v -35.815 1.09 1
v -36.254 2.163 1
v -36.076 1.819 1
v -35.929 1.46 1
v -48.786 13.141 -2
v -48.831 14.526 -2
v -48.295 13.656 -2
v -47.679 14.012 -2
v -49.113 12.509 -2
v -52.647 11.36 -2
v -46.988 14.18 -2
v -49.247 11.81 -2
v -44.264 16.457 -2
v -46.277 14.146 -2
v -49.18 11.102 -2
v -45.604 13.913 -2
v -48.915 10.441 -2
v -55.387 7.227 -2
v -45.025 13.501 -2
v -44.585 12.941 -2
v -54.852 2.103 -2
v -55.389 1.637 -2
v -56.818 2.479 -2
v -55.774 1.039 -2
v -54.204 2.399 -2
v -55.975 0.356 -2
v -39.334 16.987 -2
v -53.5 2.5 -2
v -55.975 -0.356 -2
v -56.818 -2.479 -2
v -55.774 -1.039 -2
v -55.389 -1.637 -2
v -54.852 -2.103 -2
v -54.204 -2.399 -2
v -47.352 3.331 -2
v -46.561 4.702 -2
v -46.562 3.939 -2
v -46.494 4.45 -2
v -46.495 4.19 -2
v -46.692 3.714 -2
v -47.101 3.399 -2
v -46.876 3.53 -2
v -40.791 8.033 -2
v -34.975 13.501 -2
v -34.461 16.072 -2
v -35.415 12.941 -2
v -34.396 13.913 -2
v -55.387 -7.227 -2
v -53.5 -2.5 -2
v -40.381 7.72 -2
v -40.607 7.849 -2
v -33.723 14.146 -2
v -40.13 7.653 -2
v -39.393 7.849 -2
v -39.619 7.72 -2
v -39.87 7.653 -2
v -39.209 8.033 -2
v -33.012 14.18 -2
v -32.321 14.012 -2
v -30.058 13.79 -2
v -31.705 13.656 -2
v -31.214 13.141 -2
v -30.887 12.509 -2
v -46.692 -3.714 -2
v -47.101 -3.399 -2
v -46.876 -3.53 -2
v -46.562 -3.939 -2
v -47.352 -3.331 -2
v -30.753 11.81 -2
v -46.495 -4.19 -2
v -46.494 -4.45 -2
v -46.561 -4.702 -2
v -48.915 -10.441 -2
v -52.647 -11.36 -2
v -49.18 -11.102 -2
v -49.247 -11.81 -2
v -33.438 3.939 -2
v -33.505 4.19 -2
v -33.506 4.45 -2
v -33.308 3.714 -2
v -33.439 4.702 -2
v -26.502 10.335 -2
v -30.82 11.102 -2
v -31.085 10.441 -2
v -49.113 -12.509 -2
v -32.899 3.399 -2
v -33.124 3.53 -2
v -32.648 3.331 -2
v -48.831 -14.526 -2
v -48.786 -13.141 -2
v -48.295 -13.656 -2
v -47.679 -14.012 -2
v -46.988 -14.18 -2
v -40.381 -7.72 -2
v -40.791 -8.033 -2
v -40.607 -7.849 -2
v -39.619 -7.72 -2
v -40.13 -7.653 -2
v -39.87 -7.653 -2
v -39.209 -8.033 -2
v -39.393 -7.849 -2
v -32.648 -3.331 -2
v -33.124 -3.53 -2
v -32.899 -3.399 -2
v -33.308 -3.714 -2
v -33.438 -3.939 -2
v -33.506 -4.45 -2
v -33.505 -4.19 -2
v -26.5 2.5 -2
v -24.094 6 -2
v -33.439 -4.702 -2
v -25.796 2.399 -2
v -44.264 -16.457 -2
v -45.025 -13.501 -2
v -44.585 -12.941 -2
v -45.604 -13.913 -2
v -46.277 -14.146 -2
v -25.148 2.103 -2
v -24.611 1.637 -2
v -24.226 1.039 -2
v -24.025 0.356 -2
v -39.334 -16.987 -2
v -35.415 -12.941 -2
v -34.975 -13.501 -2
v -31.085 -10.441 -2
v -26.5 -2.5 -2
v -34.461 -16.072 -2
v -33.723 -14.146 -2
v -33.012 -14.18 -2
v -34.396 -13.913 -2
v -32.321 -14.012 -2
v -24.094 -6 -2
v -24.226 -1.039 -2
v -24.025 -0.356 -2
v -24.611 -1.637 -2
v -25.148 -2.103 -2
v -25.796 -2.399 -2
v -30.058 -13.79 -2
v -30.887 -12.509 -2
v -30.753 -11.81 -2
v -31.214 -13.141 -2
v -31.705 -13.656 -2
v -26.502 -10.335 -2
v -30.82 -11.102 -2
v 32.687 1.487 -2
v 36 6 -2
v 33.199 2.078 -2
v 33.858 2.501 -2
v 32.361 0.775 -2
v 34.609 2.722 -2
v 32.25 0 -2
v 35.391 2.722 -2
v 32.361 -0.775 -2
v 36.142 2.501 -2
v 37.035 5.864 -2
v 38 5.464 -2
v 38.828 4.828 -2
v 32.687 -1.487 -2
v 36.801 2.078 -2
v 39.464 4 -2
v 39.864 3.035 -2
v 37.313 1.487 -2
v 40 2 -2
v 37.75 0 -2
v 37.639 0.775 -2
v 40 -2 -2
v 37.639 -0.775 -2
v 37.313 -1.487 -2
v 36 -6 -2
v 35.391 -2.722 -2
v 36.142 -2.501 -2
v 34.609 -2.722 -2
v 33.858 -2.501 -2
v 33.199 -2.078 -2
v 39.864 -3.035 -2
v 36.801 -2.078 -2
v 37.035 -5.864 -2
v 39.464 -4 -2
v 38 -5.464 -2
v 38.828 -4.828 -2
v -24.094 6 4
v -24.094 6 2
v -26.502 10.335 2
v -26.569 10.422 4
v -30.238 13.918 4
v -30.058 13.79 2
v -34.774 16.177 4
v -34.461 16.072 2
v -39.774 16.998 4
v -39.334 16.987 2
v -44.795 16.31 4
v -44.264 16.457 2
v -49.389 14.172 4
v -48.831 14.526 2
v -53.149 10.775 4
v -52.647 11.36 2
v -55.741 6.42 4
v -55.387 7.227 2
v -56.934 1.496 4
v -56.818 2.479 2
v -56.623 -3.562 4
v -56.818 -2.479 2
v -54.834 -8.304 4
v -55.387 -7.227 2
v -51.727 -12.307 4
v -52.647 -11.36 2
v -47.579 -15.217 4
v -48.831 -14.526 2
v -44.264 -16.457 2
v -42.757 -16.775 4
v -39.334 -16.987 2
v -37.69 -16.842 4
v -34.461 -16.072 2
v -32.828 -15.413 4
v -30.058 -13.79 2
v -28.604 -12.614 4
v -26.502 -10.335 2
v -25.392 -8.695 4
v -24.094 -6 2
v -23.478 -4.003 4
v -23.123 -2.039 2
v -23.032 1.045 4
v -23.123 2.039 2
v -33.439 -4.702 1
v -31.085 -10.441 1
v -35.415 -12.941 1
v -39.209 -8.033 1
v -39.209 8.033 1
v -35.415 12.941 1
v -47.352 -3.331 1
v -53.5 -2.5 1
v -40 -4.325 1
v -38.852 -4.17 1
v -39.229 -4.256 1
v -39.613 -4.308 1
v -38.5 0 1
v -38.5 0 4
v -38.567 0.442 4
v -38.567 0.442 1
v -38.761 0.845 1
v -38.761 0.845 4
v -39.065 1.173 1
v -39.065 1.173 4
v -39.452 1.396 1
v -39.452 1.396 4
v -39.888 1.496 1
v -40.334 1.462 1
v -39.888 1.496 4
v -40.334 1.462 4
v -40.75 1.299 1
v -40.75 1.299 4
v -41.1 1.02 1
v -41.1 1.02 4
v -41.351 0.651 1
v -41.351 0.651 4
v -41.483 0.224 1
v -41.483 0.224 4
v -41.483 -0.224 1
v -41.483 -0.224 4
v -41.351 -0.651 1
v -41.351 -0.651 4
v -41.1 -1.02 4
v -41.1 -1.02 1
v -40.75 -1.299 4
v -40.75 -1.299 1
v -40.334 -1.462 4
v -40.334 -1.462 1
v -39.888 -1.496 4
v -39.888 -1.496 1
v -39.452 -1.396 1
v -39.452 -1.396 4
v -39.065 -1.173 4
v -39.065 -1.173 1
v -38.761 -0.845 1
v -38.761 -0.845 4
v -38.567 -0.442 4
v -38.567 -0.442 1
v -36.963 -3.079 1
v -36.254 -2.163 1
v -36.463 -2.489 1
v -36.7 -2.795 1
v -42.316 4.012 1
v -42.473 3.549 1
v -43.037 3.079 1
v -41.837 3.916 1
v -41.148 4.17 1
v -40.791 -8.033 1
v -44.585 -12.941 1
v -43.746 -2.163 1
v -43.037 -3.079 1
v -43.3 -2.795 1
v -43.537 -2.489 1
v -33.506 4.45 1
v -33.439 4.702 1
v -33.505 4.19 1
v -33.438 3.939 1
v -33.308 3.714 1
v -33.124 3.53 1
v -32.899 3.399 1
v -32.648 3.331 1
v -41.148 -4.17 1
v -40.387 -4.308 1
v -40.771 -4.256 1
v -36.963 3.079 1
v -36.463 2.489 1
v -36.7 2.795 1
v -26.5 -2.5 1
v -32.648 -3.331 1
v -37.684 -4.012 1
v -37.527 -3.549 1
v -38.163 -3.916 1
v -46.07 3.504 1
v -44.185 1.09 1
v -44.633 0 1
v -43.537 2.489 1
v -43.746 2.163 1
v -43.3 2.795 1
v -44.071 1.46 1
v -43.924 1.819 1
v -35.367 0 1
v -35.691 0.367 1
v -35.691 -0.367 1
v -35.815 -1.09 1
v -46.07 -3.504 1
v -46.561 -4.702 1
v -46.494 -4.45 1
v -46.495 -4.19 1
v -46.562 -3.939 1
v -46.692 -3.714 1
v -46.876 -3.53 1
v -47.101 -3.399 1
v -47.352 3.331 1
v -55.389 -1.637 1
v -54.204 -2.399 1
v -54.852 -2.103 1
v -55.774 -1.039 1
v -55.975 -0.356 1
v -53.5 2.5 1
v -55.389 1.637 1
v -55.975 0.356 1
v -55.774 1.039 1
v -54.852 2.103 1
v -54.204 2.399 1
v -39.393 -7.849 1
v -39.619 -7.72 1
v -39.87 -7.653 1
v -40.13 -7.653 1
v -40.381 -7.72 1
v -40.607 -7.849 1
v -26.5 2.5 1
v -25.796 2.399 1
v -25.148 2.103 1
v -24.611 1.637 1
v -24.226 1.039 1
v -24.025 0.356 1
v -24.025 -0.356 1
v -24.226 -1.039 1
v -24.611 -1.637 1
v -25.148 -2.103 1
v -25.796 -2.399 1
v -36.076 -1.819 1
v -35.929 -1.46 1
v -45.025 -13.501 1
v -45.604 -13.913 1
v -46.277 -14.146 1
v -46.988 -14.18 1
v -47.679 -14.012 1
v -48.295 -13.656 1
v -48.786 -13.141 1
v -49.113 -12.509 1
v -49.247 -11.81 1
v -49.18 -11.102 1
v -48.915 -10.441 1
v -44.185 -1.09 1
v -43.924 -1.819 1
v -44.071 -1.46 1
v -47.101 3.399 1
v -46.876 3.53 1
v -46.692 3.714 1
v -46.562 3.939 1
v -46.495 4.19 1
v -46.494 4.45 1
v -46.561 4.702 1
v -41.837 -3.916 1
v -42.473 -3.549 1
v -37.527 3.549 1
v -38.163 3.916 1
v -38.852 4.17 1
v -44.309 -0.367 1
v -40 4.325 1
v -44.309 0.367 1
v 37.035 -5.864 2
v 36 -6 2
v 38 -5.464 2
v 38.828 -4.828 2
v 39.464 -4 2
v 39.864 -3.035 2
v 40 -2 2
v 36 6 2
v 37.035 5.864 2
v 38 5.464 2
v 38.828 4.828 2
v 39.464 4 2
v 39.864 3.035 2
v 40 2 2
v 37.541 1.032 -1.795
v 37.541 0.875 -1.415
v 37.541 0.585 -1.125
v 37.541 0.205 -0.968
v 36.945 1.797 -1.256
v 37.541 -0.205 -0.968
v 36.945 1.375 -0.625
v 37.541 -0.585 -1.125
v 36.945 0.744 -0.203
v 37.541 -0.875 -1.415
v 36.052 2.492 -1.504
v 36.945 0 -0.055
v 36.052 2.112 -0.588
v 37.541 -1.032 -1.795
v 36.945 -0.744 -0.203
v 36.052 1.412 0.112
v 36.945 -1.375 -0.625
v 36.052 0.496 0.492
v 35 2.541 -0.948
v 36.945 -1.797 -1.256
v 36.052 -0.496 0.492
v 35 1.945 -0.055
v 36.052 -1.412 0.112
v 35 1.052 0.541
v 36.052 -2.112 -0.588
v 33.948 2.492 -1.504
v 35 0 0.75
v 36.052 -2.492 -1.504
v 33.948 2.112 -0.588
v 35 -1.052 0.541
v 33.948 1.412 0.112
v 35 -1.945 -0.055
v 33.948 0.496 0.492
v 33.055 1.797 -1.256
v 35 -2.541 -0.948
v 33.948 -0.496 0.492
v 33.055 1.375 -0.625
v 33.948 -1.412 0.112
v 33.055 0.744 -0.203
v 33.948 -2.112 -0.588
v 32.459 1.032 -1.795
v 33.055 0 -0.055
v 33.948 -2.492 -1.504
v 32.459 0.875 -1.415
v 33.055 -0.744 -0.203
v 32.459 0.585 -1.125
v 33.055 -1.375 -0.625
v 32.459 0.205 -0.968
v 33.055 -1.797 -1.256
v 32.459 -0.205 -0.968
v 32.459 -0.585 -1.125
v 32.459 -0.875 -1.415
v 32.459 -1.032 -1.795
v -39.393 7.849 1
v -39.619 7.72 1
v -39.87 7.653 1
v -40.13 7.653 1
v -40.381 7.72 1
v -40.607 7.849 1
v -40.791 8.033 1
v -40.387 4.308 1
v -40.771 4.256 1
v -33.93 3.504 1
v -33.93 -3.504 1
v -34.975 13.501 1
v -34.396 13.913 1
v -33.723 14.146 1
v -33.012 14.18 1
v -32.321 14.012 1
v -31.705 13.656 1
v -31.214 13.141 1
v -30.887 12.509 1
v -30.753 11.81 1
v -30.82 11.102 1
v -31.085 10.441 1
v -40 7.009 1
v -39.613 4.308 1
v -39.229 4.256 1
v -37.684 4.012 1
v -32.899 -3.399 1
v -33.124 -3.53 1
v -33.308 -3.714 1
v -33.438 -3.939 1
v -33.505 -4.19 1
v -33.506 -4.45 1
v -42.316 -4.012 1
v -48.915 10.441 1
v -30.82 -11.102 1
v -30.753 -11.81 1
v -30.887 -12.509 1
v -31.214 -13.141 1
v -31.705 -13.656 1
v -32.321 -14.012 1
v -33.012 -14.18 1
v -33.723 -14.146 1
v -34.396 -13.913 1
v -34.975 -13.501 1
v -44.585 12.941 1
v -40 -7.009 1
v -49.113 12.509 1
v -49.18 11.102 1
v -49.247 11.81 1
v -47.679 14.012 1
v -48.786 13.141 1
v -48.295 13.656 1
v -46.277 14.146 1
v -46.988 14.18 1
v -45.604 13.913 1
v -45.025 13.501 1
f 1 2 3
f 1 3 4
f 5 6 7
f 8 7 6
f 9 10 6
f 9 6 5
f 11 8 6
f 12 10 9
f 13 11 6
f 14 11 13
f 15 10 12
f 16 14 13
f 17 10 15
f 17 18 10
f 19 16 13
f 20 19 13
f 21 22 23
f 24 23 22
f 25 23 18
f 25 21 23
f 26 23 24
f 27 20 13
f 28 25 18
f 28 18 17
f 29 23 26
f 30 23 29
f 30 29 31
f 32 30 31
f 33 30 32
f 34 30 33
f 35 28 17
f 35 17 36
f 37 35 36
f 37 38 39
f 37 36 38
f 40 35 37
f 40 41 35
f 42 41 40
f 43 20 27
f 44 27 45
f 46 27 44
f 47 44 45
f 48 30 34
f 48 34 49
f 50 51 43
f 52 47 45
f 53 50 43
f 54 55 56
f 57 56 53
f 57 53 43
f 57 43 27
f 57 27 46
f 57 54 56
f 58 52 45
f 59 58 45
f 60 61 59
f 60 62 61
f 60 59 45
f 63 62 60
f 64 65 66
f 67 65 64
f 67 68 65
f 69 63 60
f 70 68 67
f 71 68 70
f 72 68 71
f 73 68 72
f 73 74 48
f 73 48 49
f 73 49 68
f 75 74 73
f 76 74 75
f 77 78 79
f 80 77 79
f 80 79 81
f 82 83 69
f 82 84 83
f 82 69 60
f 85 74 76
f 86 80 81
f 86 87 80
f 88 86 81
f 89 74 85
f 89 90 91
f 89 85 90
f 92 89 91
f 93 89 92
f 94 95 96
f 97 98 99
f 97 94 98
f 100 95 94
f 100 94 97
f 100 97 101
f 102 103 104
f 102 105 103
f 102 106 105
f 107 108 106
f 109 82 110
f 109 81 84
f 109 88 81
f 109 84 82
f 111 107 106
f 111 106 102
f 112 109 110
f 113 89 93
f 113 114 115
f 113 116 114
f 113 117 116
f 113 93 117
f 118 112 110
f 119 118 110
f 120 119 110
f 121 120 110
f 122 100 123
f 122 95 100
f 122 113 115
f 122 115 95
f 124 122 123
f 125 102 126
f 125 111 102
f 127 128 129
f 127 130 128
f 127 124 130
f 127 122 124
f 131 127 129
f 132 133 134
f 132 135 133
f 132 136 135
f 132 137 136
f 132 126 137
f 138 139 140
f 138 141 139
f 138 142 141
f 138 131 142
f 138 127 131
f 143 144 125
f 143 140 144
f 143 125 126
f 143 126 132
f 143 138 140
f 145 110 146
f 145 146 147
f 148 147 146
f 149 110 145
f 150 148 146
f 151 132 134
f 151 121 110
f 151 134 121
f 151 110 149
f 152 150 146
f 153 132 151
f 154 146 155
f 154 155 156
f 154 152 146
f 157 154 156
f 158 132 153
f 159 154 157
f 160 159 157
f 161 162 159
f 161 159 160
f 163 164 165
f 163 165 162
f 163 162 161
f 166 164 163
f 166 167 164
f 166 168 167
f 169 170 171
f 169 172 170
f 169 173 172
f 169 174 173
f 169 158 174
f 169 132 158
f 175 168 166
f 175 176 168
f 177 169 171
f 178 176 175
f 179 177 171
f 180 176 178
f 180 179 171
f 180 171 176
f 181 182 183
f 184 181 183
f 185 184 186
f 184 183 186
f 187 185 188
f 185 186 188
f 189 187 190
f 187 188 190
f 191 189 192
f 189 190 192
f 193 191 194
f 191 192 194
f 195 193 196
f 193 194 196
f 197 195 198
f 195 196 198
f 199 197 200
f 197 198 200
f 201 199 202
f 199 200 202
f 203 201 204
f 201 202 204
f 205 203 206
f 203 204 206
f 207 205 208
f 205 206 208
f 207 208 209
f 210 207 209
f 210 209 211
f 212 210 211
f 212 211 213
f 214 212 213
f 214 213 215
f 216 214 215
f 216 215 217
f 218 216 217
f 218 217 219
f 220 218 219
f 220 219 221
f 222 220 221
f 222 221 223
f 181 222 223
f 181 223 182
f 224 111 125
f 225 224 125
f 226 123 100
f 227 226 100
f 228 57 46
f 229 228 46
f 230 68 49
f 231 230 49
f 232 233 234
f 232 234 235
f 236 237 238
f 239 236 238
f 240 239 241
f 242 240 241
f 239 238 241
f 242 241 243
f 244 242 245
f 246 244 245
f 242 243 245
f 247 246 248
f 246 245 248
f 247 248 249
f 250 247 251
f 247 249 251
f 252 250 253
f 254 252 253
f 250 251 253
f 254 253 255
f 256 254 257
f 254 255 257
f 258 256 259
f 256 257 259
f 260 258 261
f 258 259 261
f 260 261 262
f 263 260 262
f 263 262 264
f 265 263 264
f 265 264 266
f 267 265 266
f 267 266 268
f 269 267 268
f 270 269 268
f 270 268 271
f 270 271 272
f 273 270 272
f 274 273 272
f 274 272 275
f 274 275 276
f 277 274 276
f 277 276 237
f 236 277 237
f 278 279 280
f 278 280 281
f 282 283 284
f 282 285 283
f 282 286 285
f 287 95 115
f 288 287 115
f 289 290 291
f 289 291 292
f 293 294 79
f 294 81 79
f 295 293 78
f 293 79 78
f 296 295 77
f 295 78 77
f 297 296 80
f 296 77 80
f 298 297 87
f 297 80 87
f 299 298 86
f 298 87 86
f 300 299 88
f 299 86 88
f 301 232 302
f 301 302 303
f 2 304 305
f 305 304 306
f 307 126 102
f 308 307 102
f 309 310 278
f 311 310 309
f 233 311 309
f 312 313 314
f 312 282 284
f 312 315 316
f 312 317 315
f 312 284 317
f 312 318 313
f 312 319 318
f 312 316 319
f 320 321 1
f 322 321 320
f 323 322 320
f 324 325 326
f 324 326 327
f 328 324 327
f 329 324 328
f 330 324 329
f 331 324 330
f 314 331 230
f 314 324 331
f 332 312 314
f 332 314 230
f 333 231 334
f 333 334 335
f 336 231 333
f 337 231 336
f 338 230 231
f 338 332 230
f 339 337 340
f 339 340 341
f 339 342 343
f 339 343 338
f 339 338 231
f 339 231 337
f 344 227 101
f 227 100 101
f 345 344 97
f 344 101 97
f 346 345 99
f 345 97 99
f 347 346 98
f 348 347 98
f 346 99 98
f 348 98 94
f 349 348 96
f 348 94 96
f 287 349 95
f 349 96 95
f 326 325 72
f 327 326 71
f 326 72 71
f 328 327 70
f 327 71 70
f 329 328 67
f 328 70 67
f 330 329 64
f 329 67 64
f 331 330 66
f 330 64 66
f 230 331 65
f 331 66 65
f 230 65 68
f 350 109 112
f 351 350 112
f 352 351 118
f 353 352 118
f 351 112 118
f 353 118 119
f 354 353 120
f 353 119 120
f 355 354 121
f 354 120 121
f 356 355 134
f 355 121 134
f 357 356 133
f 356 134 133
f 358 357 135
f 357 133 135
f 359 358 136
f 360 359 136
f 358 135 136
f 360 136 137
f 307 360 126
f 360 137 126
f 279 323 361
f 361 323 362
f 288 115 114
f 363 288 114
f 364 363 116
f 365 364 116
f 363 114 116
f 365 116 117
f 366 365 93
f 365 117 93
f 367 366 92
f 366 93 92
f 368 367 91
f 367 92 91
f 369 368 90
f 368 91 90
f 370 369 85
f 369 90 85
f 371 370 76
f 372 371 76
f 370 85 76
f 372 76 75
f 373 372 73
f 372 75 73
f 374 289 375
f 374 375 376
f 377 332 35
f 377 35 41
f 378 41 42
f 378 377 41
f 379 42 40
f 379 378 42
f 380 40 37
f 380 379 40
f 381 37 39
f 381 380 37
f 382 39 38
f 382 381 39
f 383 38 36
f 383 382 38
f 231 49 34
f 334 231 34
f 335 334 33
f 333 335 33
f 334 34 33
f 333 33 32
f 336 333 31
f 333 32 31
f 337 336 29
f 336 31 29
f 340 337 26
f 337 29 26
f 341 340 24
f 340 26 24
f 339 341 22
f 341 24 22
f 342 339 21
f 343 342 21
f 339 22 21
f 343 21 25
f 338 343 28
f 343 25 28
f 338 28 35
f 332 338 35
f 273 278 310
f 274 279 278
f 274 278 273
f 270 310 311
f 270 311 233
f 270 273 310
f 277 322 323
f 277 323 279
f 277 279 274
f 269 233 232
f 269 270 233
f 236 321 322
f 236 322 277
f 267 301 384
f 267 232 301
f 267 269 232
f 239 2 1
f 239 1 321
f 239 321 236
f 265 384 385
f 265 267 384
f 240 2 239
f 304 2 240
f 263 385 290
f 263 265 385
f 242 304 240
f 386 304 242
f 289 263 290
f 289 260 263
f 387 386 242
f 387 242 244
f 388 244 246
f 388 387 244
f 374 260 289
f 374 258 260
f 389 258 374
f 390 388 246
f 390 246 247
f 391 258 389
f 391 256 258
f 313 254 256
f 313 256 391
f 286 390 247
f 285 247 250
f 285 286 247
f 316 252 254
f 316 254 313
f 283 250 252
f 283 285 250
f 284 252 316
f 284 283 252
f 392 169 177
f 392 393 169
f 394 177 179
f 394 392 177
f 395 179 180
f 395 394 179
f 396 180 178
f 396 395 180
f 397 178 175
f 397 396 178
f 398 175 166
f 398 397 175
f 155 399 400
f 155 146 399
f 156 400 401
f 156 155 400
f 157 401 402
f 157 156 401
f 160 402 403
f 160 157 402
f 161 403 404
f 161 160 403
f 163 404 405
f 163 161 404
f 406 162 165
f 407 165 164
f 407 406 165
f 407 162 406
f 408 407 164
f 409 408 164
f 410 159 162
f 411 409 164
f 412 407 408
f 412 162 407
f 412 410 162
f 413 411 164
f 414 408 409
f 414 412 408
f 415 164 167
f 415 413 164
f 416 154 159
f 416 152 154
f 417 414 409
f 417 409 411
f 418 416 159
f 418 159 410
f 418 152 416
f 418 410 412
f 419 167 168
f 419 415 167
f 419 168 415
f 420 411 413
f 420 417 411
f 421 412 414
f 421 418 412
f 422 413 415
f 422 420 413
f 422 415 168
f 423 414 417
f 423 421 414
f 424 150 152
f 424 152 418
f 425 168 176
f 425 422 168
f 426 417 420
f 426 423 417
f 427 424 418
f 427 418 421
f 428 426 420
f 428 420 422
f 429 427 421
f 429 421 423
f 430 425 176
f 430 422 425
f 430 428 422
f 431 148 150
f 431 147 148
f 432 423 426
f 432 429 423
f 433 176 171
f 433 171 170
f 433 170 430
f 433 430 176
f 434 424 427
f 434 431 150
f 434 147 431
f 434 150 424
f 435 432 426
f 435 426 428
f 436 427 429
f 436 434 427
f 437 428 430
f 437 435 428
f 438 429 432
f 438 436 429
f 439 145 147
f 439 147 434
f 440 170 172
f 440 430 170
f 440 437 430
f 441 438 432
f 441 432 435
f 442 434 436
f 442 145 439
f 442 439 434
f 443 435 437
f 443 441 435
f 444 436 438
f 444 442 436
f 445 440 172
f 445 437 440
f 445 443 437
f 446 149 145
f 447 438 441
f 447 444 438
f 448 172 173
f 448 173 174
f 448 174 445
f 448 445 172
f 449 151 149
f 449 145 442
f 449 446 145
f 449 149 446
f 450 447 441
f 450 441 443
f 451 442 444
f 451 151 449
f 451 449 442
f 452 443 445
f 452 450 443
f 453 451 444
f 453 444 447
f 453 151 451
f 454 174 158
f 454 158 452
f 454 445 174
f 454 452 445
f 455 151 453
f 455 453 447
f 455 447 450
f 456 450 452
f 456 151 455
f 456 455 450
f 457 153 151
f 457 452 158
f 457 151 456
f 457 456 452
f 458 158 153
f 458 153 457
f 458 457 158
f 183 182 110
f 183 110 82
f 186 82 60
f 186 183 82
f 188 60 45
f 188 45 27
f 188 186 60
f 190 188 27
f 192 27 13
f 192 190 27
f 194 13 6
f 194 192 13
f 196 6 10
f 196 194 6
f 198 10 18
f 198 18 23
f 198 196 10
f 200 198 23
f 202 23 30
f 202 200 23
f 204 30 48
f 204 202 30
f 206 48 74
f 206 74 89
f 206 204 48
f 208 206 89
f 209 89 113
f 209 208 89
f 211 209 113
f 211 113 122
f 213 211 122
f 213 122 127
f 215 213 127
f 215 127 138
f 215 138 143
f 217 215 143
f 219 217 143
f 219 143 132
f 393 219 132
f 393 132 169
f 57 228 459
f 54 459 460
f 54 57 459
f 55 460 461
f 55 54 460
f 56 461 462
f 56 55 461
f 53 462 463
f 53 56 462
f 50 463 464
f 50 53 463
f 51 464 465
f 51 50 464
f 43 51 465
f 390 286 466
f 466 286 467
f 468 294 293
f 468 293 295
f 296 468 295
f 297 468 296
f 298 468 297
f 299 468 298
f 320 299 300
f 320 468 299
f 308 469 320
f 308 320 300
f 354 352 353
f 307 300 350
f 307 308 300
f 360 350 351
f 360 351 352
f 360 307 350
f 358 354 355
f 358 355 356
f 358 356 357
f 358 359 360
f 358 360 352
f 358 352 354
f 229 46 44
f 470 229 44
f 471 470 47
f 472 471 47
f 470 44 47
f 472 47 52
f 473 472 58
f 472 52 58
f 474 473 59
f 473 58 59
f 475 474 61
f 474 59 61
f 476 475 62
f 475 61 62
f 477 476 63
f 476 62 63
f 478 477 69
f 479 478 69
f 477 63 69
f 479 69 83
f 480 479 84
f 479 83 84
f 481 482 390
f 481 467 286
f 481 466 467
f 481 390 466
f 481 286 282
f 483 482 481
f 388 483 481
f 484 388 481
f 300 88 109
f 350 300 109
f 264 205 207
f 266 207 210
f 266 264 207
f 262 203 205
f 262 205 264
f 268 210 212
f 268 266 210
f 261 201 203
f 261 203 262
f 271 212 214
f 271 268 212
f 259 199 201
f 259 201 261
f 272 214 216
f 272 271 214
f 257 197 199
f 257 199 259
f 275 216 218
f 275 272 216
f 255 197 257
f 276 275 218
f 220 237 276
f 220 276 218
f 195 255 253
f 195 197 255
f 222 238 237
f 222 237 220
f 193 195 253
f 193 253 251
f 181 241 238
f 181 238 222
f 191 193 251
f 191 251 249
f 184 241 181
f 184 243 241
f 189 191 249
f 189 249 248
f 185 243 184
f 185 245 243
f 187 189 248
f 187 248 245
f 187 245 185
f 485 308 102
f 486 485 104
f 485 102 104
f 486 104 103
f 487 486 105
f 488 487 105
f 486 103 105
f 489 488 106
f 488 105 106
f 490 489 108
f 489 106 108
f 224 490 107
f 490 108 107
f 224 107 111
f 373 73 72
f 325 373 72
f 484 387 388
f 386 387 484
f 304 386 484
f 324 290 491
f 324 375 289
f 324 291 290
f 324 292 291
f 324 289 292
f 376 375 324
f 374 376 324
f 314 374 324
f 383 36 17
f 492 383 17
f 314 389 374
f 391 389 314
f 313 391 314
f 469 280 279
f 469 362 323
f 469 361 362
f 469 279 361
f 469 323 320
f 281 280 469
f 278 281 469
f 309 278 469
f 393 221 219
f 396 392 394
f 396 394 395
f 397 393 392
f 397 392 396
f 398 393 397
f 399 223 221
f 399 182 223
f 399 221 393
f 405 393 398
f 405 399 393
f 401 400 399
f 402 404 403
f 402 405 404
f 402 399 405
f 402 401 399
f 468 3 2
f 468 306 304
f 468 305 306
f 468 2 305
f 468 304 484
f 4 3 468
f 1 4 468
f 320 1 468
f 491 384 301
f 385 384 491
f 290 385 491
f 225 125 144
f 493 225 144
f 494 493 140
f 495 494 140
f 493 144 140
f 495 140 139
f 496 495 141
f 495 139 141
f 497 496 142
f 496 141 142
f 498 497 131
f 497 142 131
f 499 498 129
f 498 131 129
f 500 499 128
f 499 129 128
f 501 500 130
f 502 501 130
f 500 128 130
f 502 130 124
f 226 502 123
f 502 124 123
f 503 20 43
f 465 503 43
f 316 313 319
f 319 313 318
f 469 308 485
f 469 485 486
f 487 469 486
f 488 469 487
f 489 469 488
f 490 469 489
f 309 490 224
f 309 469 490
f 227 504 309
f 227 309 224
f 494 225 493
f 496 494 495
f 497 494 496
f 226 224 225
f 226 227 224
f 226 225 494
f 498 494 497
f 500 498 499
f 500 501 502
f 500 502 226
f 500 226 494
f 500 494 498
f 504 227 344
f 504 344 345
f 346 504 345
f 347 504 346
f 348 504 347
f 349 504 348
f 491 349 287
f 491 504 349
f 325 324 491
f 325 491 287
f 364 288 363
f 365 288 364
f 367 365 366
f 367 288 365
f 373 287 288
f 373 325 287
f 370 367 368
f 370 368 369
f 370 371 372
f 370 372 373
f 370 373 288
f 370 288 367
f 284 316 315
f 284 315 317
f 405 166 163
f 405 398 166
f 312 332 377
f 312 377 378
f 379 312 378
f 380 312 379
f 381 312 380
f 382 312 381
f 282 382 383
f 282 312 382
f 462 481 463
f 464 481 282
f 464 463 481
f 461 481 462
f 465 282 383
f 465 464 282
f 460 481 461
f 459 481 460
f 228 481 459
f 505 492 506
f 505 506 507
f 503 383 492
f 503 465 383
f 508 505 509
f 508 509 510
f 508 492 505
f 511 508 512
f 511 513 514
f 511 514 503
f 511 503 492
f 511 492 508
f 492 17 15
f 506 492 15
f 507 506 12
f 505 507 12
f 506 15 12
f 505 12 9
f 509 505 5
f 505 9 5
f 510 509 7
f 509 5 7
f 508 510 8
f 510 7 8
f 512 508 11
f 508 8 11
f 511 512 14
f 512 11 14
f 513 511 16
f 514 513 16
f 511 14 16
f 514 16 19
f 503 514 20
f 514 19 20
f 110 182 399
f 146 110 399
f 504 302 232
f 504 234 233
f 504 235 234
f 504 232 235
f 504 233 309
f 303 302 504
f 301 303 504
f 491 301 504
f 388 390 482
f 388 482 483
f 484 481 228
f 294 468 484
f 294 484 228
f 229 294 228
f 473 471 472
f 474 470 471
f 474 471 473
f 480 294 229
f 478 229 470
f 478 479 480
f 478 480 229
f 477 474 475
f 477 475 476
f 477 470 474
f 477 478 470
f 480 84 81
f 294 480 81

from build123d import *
from build123d.topology import SkipClean

# Parameters (mm, degrees)
SKETCH1_W                       = 80
SKETCH1_H                       = 12
BOSS_EXTRUDE1_DEPTH             = 2
CUT_REVOLVE1_ANGLE              = 180
FILLET2_R                       = 4
BOSS_EXTRUDE2_REACH             = 42.645
SKETCH6_R                       = 17
BOSS_EXTRUDE2_DIRECTION_2_DEPTH = 2
SKETCH7_R                       = 2.5
CUT_EXTRUDE3_DEPTH              = 3
CIRPATTERN1_COUNT               = 6
FILLET3_R                       = 1
CUT_EXTRUDE4_REACH              = 61.783
SKETCH8_R                       = 1.5


with BuildPart() as part:
    # Sketch1 → Boss-Extrude1 (new, symmetric)
    with BuildSketch(Plane.XY):
        Rectangle(SKETCH1_W, SKETCH1_H)
    extrude(amount=BOSS_EXTRUDE1_DEPTH, both=True)

    # Sketch3 → Cut-Revolve1 (revolve, cut)
    with SkipClean():  # the faces are left unmerged after this step: merging them gives an invalid solid
        with BuildSketch(Plane.XY.offset(-2)):
            with BuildLine():
                ThreePointArc((37.75, 0), (35, 2.75), (32.25, 0))
                Line((32.25, 0), (37.75, 0))
            make_face()
            with BuildLine():
                Line((37.75, 0), (32.25, 0))
                ThreePointArc((32.25, 0), (35, -2.75), (37.75, 0))
            make_face()
        revolve(axis=Axis((32.25, 0, -2), (1, 0, 0)), revolution_arc=CUT_REVOLVE1_ANGLE, mode=Mode.SUBTRACT)

    # Fillet2
    fillet2_edges = [part.edges().sort_by_distance(p)[0] for p in [
        (40, -6, 0),
        (40, 6, 0),
    ]]
    fillet(fillet2_edges, radius=FILLET2_R)

    # Boss-Extrude2: up to this face of the body (flat: up to its plane)
    boss_extrude2_end = Plane(part.part.faces().sort_by_distance((-1.183693998, 0, -2))[0])
    # Sketch6 → Boss-Extrude2 (add, up to the picked face)
    with BuildSketch(Plane.XY.offset(2), mode=Mode.PRIVATE) as boss_extrude2_sk1:
        with Locations(Location((-40, 0, 0), (0, 0, 20.667316494))):
            Circle(SKETCH6_R)
    boss_extrude2_tool1 = split(extrude(boss_extrude2_sk1.sketch, amount=-BOSS_EXTRUDE2_REACH, mode=Mode.PRIVATE), bisect_by=boss_extrude2_end, keep=Keep.BOTH, mode=Mode.PRIVATE)
    add(boss_extrude2_tool1.solids().sort_by(Axis((-40, 0, 2), (0, 0, -1)))[0])

    # Sketch6 → Boss-Extrude2 direction 2 (add)
    with BuildSketch(Plane.XY.offset(2)):
        with Locations(Location((-40, 0, 0), (0, 0, 20.667316494))):
            Circle(SKETCH6_R)
    extrude(amount=BOSS_EXTRUDE2_DIRECTION_2_DEPTH)

    # Sketch7 → Cut-Extrude3 (cut)
    with BuildSketch(Plane(origin=(0, 0, -2), x_dir=(-1, 0, 0), z_dir=(0, 0, -1))):
        with BuildLine():
            Line((41.148365434, 4.169758006), (40, 4.325))
            ThreePointArc((40, 4.325), (35.675, 0), (40, -4.325))
            Line((40, -4.325), (41.148365434, -4.169758006))
            ThreePointArc((41.148365434, -4.169758006), (43.440371019, -2.620967808), (44.325, 0))
            ThreePointArc((44.325, 0), (43.440371019, 2.620967808), (41.148365434, 4.169758006))
        make_face()
        with BuildLine():
            Line((53.5, 2.5), (41.148365434, 4.169758006))
            ThreePointArc((41.148365434, 4.169758006), (43.440371019, 2.620967808), (44.325, 0))
            ThreePointArc((44.325, 0), (43.440371019, -2.620967808), (41.148365434, -4.169758006))
            Line((41.148365434, -4.169758006), (53.5, -2.5))
            ThreePointArc((53.5, -2.5), (51, 0), (53.5, 2.5))
        make_face()
        with Locations((53.5, 0)):
            Circle(SKETCH7_R)
    cut_extrude3 = extrude(amount=-CUT_EXTRUDE3_DEPTH, mode=Mode.SUBTRACT)

    # CirPattern1: Cut-Extrude3 ×6 about axis
    cirpattern1_axis = Axis((-40, 0, 0), (0, 0, 1))
    for i in range(1, CIRPATTERN1_COUNT):
        add(cut_extrude3.rotate(cirpattern1_axis, i * 360 / CIRPATTERN1_COUNT), mode=Mode.SUBTRACT)

    # Fillet3
    fillet3_edges = [part.edges().sort_by_distance(p)[0] for p in [
        (-46.069873399, 3.504443041, -0.5),
        (-40, 7.008886081, -0.5),
        (-33.930126601, 3.504443041, -0.5),
        (-33.930126601, -3.504443041, -0.5),
        (-40, -7.008886081, -0.5),
        (-46.069873399, -3.504443041, -0.5),
    ]]
    fillet(fillet3_edges, radius=FILLET3_R)

    # Sketch8 → Cut-Extrude4 (cut, up to next)
    with BuildSketch(Plane.XY.offset(4), mode=Mode.PRIVATE) as cut_extrude4_sk1:
        with Locations((-40, 0)):
            Circle(SKETCH8_R)
    cut_extrude4_tool1 = extrude(cut_extrude4_sk1.sketch, amount=-CUT_EXTRUDE4_REACH, mode=Mode.PRIVATE) & part.part
    add(cut_extrude4_tool1.solids().sort_by_distance((-40, 0, 4))[0], mode=Mode.SUBTRACT)


solid = part.part
